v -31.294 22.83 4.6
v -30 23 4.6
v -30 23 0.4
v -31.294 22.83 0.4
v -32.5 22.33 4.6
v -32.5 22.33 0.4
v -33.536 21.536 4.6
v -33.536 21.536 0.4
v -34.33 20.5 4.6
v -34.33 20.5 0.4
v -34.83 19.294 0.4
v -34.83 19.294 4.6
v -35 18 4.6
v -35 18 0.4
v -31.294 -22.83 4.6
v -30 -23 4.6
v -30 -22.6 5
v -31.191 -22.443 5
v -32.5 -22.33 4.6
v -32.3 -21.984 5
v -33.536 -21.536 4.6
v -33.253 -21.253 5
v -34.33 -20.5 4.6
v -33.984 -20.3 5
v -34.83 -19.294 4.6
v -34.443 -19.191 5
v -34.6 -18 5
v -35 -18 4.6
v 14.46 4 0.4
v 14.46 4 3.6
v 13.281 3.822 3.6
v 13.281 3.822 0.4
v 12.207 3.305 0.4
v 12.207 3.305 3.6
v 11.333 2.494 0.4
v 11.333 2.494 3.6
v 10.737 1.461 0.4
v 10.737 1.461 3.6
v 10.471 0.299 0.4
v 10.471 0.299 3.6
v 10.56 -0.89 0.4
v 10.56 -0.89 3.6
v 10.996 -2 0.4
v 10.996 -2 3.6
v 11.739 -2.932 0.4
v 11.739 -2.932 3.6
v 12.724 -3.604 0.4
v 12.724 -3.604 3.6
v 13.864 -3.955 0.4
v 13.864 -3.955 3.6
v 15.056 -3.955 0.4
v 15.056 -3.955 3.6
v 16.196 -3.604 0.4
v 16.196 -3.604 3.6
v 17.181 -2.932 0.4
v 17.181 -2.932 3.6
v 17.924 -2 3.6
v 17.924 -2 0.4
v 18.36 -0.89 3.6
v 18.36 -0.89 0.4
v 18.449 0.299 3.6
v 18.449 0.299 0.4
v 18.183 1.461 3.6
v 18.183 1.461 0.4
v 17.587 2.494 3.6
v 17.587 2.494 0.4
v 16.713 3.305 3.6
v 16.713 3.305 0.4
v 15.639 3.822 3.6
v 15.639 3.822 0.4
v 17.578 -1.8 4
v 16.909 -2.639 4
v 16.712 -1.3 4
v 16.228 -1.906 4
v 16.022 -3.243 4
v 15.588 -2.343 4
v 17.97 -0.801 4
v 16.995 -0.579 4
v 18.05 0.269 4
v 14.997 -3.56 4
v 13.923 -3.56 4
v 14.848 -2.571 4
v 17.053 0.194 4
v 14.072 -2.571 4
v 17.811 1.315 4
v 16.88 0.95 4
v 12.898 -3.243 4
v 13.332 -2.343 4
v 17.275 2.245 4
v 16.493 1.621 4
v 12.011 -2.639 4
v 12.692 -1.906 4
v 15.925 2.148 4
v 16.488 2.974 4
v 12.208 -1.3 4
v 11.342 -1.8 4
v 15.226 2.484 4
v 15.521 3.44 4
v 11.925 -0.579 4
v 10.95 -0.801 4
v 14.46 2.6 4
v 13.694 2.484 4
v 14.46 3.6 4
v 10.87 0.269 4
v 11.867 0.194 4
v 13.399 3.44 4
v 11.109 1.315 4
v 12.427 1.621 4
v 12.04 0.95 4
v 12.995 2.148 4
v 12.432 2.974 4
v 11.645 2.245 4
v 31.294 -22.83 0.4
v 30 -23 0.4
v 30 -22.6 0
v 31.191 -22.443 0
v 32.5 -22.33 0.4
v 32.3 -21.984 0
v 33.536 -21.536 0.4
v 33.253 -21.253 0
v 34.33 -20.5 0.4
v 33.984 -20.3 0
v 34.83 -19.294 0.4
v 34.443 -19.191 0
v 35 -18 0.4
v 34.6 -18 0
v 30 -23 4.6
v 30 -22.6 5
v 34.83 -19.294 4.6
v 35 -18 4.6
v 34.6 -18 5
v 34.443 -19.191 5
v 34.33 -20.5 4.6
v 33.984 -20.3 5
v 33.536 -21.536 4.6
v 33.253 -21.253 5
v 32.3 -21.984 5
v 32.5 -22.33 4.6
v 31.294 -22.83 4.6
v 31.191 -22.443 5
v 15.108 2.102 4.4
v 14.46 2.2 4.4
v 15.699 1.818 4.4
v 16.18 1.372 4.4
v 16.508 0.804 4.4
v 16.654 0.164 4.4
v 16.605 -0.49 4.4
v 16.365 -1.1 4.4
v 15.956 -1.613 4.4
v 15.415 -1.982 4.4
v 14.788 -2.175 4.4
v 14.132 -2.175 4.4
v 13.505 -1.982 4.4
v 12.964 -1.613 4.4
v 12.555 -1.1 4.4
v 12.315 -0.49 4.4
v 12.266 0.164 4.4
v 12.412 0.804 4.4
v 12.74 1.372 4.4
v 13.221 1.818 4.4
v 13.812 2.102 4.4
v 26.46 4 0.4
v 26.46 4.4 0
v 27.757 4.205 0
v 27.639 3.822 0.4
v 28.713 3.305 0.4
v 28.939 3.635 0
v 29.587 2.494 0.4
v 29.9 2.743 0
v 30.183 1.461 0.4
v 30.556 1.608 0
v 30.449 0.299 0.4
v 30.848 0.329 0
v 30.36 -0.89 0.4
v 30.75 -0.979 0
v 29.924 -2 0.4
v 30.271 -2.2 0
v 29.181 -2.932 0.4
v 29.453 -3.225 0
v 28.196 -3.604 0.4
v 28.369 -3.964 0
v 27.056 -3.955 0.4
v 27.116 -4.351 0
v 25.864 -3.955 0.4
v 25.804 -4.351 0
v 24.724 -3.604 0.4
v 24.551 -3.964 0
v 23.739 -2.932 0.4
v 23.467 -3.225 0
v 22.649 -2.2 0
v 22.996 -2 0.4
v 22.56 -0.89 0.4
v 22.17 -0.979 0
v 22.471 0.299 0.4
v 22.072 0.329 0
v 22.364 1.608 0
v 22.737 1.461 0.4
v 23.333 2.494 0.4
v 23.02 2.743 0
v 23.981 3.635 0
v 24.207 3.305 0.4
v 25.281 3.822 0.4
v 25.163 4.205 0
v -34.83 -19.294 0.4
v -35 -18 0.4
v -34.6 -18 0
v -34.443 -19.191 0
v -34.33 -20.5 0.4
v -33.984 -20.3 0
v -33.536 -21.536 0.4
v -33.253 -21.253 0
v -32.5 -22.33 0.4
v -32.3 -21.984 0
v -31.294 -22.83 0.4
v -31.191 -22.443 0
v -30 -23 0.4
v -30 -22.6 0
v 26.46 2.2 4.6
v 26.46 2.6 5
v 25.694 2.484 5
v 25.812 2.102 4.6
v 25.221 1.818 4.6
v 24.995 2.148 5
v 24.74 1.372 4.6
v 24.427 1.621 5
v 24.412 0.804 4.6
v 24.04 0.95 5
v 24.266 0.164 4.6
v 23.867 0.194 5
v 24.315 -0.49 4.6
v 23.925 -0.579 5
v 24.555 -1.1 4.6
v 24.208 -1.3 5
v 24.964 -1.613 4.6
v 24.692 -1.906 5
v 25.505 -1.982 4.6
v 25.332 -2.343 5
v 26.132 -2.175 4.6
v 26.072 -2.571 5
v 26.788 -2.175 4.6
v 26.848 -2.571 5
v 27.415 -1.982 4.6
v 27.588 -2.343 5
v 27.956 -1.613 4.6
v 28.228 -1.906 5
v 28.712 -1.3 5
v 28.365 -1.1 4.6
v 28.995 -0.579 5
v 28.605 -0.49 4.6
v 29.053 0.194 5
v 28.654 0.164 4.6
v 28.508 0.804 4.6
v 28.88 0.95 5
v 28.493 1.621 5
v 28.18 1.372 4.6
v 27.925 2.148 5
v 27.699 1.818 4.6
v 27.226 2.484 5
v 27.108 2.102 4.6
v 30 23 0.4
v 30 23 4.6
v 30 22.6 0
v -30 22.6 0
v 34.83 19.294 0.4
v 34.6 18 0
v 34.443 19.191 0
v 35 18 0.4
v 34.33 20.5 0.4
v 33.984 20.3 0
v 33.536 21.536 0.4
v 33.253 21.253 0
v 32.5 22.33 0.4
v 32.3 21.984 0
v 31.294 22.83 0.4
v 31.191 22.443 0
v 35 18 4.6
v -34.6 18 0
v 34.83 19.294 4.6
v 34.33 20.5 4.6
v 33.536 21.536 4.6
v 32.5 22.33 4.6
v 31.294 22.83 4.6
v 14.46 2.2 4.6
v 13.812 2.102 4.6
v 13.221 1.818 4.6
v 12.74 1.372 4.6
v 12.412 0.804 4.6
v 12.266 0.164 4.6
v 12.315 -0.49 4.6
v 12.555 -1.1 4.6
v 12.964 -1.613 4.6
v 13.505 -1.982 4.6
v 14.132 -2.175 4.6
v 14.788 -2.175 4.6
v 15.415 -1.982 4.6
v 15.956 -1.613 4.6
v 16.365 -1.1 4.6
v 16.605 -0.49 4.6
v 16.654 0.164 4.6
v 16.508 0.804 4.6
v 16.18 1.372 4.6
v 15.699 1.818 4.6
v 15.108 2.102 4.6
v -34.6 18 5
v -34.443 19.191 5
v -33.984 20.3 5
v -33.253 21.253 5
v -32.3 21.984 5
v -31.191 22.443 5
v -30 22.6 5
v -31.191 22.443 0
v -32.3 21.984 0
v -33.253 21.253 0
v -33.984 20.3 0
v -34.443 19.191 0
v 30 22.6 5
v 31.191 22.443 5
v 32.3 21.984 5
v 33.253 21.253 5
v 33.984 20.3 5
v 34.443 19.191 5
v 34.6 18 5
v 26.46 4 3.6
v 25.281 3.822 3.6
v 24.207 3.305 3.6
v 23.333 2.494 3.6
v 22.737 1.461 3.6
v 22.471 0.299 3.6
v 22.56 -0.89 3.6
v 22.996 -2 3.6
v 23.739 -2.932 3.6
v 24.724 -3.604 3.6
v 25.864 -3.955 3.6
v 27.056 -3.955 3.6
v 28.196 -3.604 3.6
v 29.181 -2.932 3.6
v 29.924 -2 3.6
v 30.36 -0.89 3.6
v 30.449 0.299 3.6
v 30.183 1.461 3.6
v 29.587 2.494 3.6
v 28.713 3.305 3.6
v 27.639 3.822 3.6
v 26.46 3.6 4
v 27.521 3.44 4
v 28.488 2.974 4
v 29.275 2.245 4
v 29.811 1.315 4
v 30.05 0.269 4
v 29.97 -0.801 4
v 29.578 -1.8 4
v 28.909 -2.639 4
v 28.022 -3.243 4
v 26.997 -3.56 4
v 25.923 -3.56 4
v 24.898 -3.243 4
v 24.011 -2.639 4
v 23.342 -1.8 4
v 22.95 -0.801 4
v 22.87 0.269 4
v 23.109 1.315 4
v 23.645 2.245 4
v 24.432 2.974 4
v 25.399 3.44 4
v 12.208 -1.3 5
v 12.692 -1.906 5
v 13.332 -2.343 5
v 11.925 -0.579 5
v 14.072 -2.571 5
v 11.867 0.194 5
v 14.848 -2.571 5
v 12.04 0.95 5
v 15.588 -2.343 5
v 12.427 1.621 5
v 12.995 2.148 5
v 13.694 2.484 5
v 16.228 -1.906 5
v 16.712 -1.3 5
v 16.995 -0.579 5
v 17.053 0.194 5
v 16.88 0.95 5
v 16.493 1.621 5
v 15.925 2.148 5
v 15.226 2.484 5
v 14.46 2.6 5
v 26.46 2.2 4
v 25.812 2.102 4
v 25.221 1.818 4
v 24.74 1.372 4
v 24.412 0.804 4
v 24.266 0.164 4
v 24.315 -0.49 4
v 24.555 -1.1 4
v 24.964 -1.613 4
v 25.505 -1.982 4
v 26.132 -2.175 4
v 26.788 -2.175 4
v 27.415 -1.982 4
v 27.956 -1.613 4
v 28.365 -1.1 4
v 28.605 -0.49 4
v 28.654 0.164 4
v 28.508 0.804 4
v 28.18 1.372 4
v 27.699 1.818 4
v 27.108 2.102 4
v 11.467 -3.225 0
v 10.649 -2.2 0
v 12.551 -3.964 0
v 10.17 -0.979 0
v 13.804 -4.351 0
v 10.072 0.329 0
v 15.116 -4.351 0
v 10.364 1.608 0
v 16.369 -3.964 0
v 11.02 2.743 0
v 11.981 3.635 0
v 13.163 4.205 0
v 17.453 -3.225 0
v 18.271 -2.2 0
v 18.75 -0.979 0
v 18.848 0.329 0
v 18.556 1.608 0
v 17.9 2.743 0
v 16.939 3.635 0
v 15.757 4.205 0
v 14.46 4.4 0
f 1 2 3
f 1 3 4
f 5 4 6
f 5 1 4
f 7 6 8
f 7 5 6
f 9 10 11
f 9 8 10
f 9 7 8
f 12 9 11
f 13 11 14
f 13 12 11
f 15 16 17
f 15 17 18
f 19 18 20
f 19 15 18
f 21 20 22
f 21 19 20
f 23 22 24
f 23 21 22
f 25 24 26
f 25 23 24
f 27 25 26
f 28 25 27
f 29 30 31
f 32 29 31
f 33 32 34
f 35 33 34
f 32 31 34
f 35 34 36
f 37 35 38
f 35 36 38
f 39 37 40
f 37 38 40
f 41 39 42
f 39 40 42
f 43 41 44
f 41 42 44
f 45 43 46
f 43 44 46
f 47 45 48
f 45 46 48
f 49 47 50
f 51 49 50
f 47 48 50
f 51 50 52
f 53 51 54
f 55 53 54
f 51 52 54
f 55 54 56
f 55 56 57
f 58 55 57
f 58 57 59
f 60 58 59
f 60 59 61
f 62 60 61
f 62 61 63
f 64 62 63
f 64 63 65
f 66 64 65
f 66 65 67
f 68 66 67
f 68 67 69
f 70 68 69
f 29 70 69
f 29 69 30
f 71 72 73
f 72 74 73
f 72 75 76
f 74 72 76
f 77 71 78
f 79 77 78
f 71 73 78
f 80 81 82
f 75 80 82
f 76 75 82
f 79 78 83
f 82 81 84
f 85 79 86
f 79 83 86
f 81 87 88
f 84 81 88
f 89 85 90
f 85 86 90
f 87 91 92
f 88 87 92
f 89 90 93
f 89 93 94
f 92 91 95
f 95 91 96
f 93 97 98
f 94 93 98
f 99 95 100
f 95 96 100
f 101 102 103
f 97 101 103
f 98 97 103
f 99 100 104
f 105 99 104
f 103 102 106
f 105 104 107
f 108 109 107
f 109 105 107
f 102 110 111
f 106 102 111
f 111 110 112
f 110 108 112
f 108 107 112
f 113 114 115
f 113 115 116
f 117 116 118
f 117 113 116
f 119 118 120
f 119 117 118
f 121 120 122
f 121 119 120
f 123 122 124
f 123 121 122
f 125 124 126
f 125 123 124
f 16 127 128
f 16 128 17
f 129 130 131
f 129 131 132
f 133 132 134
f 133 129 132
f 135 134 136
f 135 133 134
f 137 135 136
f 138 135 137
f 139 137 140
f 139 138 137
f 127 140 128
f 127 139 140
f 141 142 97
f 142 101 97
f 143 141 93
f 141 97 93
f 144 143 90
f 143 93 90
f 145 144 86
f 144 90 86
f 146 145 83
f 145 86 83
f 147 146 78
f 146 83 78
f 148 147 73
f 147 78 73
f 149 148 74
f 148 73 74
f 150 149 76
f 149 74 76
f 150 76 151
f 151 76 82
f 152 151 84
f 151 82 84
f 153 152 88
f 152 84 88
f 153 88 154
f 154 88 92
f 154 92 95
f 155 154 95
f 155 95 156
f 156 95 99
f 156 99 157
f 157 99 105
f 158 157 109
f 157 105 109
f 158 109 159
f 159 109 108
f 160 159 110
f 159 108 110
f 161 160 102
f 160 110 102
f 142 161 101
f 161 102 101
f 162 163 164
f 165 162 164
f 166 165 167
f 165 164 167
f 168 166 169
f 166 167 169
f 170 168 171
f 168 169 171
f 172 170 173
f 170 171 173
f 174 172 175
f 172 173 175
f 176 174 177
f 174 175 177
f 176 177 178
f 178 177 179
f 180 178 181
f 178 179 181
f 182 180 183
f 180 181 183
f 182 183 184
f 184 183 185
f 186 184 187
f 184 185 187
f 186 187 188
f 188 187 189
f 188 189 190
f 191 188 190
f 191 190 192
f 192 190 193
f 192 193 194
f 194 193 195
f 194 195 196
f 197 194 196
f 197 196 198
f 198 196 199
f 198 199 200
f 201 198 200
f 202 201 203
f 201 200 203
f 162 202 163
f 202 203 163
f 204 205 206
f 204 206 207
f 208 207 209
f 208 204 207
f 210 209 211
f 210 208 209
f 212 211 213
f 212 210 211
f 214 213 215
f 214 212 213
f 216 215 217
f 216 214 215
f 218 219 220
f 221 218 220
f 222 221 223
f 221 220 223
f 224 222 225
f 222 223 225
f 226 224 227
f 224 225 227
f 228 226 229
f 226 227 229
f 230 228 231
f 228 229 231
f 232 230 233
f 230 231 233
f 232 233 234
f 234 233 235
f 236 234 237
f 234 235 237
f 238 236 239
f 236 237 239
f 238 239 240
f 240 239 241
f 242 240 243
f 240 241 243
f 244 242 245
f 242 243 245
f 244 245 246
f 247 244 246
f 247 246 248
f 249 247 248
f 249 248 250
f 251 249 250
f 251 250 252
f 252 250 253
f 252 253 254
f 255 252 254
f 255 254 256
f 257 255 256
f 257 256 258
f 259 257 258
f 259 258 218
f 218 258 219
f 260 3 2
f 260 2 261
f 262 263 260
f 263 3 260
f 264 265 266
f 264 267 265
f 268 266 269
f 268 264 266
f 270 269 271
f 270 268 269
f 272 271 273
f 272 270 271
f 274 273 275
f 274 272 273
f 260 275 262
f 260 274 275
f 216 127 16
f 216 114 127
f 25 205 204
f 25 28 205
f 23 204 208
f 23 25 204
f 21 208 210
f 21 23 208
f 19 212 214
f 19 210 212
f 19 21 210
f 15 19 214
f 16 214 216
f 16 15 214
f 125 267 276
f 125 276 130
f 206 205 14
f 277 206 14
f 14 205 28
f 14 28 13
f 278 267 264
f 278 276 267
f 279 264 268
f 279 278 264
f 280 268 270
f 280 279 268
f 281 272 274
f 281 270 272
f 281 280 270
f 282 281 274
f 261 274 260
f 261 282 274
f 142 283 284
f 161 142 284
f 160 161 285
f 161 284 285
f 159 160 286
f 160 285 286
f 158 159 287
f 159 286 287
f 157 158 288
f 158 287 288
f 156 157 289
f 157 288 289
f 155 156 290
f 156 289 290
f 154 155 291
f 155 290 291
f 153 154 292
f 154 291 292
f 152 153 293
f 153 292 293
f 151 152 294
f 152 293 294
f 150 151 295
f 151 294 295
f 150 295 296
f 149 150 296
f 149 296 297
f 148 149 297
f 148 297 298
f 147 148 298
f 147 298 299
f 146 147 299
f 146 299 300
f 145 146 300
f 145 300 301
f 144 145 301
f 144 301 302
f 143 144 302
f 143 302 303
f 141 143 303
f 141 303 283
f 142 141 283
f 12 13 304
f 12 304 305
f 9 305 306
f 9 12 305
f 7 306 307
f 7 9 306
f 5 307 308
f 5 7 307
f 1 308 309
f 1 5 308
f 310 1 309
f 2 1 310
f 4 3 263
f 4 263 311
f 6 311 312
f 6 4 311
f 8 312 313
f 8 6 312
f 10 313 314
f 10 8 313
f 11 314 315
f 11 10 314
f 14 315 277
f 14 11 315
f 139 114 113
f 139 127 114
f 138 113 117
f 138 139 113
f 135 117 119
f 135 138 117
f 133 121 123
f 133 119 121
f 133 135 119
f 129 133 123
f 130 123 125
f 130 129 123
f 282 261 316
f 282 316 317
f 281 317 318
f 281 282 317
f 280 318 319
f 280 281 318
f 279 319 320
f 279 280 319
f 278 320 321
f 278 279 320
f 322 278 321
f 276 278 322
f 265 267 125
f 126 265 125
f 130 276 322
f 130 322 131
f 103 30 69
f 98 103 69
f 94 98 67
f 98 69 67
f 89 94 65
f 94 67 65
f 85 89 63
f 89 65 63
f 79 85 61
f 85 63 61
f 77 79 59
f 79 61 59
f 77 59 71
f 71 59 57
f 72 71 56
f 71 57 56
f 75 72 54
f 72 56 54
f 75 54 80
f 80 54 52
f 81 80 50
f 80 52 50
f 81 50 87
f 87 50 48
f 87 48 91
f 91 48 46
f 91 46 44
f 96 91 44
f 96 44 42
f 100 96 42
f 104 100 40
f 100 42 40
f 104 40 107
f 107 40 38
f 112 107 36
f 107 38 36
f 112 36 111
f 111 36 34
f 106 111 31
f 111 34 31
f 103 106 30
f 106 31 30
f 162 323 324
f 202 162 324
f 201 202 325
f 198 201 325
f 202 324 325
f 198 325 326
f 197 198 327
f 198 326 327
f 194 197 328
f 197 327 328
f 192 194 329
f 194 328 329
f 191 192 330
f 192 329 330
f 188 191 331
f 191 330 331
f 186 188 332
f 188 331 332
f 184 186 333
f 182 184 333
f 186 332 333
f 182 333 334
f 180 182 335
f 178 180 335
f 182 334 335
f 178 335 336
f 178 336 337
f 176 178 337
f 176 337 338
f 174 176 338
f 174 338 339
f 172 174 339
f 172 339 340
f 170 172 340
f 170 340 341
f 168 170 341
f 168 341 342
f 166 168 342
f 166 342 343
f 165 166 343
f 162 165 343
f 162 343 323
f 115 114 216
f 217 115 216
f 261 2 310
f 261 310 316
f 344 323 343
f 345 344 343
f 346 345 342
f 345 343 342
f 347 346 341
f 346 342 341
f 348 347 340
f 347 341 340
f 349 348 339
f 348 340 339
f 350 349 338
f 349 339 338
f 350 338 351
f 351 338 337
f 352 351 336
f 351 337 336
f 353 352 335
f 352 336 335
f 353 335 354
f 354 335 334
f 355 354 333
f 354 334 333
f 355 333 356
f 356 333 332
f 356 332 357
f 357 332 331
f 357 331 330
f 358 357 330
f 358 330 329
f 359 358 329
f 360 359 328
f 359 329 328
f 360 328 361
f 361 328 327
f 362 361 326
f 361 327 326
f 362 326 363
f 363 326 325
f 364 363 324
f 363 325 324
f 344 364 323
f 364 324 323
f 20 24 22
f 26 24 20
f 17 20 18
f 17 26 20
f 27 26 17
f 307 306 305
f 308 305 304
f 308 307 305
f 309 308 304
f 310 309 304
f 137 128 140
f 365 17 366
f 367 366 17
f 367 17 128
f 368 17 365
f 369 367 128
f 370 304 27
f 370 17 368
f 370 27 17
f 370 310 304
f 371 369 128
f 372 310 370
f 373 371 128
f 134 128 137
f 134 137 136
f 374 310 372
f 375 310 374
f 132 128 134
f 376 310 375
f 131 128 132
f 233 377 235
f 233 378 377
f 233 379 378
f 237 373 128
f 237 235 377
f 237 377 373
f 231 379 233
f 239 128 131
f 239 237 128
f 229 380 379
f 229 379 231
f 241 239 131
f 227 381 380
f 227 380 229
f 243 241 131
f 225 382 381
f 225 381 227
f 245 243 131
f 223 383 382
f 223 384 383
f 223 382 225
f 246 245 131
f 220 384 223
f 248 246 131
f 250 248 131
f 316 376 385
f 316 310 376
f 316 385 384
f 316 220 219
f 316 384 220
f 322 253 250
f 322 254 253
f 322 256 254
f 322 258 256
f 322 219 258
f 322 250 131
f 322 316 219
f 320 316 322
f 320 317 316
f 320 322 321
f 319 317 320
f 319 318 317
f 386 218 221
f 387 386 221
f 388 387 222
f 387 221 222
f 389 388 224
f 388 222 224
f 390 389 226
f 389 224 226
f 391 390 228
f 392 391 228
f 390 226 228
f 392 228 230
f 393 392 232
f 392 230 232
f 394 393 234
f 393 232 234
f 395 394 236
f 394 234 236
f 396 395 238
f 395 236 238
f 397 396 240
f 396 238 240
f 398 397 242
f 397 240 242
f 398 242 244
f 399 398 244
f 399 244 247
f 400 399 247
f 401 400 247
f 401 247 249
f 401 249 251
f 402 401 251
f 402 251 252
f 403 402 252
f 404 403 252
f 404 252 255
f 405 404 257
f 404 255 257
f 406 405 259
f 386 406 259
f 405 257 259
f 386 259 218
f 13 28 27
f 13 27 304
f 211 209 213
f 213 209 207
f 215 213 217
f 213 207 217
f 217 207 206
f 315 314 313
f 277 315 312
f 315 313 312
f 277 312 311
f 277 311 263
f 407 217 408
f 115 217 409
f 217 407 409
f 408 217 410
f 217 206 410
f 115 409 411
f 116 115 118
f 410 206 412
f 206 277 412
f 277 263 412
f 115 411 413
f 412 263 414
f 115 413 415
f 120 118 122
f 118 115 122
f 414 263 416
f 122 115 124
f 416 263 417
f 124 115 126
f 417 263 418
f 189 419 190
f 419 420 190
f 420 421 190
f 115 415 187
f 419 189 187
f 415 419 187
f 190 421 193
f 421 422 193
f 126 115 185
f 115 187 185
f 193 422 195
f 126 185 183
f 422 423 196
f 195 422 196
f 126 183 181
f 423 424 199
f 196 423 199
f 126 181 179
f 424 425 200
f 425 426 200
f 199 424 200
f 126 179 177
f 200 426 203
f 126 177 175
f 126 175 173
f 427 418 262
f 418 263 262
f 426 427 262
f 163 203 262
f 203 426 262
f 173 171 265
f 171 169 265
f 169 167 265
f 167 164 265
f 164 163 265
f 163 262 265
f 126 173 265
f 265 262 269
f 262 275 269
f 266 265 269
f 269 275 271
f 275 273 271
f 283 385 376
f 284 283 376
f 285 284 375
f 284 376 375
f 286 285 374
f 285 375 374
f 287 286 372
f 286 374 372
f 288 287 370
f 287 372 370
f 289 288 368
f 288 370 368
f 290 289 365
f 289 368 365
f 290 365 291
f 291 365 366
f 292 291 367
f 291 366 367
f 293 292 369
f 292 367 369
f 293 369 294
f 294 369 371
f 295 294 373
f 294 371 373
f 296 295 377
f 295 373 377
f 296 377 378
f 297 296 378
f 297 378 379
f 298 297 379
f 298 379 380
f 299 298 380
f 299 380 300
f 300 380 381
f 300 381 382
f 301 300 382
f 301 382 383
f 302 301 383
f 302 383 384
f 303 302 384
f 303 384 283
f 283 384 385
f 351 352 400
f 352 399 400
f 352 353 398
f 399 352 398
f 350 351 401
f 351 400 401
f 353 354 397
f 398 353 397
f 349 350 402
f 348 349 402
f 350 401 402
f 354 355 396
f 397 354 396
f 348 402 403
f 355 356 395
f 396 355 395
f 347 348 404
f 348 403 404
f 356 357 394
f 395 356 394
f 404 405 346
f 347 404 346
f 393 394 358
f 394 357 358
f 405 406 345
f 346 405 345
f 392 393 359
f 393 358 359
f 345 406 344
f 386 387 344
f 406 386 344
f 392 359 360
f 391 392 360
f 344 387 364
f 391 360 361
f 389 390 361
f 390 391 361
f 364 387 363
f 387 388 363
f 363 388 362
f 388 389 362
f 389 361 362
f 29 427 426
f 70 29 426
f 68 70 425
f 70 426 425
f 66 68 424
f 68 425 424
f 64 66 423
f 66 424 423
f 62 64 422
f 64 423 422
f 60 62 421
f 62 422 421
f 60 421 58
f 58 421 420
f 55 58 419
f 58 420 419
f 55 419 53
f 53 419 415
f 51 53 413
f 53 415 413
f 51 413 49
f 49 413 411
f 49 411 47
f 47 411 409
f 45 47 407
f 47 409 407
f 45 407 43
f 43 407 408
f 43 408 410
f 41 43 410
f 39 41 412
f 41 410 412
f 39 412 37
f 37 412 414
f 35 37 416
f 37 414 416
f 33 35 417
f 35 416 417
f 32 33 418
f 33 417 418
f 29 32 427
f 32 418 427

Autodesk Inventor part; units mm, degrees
ref_plane "YZ Plane" through (0, 0, 0) normal (1, 0, 0) x (0, 1, 0)
ref_plane "XZ Plane" through (0, 0, 0) normal (0, 1, 0) x (-1, 0, 0)
ref_plane "XY Plane" through (0, 0, 0) normal (0, 0, 1) x (1, 0, 0)
sketch "Sketch1" plane through (0, 0, 0) normal (0, 0, 1) x (1, 0, 0)
  line L0 (-35, 23) -> (35, 23)
  line L1 (35, 23) -> (35, -23)
  line L2 (35, -23) -> (-35, -23)
  line L3 (-35, -23) -> (-35, 23)
  point P0 (0, 0)
  point P1 (0, 23)
  point P2 (35, 0)
  dimension "d0" = 46
  dimension "d1" = 70
extrude "Extrusion1" add sketch "Sketch1" along normal blind 5
sketch "Sketch3" plane through (0, 0, 0) normal (0, 0, -1) x (-1, 0, 0)
  line L0 (-26.46, 0) -> (-14.46, 0) construction
  line L1 (-35, -23) -> (-35, 23) projected
  point P0 (0, 0)
  dimension "d7" = 12
  dimension "d8" = 8.54
hole "Hole1" at (14.46, 0, 0) at (26.46, 0, 0) direction (0, 0, 1) diameter 4.4 end through all counterbore diameter 8 counterbore depth 4
fillet "Fillet1" radius 5 4 edges at (35, -23, 2.5) (35, 23, 2.5) (-35, 23, 2.5) (-35, -23, 2.5)
chamfer "Chamfer2" distance 0.4 angle 45 23 edges at (0, -23, 5) (33.5355, -21.5355, 5) (35, 0, 5) (33.5355, 21.5355, 5) (0, 23, 5) (-33.5355, 21.5355, 5) (-35, 0, 5) (-33.5355, -21.5355, 5) (0, -23, 0) (33.5355, -21.5355, 0) (35, 0, 0) (33.5355, 21.5355, 0) (0, 23, 0) (-33.5355, 21.5355, 0) (-35, 0, 0) (-33.5355, -21.5355, 0) (14.46, -4, 0) (26.46, -4, 0) (26.46, -2.2, 5) (14.46, -2.2, 5) (14.46, -2.2, 4) (14.46, -4, 4) (26.46, -4, 4)
equation "\"d2\" = thickness"
equation "\"thickness\" = 5"
properties part number "Takumar-foot-flat"
